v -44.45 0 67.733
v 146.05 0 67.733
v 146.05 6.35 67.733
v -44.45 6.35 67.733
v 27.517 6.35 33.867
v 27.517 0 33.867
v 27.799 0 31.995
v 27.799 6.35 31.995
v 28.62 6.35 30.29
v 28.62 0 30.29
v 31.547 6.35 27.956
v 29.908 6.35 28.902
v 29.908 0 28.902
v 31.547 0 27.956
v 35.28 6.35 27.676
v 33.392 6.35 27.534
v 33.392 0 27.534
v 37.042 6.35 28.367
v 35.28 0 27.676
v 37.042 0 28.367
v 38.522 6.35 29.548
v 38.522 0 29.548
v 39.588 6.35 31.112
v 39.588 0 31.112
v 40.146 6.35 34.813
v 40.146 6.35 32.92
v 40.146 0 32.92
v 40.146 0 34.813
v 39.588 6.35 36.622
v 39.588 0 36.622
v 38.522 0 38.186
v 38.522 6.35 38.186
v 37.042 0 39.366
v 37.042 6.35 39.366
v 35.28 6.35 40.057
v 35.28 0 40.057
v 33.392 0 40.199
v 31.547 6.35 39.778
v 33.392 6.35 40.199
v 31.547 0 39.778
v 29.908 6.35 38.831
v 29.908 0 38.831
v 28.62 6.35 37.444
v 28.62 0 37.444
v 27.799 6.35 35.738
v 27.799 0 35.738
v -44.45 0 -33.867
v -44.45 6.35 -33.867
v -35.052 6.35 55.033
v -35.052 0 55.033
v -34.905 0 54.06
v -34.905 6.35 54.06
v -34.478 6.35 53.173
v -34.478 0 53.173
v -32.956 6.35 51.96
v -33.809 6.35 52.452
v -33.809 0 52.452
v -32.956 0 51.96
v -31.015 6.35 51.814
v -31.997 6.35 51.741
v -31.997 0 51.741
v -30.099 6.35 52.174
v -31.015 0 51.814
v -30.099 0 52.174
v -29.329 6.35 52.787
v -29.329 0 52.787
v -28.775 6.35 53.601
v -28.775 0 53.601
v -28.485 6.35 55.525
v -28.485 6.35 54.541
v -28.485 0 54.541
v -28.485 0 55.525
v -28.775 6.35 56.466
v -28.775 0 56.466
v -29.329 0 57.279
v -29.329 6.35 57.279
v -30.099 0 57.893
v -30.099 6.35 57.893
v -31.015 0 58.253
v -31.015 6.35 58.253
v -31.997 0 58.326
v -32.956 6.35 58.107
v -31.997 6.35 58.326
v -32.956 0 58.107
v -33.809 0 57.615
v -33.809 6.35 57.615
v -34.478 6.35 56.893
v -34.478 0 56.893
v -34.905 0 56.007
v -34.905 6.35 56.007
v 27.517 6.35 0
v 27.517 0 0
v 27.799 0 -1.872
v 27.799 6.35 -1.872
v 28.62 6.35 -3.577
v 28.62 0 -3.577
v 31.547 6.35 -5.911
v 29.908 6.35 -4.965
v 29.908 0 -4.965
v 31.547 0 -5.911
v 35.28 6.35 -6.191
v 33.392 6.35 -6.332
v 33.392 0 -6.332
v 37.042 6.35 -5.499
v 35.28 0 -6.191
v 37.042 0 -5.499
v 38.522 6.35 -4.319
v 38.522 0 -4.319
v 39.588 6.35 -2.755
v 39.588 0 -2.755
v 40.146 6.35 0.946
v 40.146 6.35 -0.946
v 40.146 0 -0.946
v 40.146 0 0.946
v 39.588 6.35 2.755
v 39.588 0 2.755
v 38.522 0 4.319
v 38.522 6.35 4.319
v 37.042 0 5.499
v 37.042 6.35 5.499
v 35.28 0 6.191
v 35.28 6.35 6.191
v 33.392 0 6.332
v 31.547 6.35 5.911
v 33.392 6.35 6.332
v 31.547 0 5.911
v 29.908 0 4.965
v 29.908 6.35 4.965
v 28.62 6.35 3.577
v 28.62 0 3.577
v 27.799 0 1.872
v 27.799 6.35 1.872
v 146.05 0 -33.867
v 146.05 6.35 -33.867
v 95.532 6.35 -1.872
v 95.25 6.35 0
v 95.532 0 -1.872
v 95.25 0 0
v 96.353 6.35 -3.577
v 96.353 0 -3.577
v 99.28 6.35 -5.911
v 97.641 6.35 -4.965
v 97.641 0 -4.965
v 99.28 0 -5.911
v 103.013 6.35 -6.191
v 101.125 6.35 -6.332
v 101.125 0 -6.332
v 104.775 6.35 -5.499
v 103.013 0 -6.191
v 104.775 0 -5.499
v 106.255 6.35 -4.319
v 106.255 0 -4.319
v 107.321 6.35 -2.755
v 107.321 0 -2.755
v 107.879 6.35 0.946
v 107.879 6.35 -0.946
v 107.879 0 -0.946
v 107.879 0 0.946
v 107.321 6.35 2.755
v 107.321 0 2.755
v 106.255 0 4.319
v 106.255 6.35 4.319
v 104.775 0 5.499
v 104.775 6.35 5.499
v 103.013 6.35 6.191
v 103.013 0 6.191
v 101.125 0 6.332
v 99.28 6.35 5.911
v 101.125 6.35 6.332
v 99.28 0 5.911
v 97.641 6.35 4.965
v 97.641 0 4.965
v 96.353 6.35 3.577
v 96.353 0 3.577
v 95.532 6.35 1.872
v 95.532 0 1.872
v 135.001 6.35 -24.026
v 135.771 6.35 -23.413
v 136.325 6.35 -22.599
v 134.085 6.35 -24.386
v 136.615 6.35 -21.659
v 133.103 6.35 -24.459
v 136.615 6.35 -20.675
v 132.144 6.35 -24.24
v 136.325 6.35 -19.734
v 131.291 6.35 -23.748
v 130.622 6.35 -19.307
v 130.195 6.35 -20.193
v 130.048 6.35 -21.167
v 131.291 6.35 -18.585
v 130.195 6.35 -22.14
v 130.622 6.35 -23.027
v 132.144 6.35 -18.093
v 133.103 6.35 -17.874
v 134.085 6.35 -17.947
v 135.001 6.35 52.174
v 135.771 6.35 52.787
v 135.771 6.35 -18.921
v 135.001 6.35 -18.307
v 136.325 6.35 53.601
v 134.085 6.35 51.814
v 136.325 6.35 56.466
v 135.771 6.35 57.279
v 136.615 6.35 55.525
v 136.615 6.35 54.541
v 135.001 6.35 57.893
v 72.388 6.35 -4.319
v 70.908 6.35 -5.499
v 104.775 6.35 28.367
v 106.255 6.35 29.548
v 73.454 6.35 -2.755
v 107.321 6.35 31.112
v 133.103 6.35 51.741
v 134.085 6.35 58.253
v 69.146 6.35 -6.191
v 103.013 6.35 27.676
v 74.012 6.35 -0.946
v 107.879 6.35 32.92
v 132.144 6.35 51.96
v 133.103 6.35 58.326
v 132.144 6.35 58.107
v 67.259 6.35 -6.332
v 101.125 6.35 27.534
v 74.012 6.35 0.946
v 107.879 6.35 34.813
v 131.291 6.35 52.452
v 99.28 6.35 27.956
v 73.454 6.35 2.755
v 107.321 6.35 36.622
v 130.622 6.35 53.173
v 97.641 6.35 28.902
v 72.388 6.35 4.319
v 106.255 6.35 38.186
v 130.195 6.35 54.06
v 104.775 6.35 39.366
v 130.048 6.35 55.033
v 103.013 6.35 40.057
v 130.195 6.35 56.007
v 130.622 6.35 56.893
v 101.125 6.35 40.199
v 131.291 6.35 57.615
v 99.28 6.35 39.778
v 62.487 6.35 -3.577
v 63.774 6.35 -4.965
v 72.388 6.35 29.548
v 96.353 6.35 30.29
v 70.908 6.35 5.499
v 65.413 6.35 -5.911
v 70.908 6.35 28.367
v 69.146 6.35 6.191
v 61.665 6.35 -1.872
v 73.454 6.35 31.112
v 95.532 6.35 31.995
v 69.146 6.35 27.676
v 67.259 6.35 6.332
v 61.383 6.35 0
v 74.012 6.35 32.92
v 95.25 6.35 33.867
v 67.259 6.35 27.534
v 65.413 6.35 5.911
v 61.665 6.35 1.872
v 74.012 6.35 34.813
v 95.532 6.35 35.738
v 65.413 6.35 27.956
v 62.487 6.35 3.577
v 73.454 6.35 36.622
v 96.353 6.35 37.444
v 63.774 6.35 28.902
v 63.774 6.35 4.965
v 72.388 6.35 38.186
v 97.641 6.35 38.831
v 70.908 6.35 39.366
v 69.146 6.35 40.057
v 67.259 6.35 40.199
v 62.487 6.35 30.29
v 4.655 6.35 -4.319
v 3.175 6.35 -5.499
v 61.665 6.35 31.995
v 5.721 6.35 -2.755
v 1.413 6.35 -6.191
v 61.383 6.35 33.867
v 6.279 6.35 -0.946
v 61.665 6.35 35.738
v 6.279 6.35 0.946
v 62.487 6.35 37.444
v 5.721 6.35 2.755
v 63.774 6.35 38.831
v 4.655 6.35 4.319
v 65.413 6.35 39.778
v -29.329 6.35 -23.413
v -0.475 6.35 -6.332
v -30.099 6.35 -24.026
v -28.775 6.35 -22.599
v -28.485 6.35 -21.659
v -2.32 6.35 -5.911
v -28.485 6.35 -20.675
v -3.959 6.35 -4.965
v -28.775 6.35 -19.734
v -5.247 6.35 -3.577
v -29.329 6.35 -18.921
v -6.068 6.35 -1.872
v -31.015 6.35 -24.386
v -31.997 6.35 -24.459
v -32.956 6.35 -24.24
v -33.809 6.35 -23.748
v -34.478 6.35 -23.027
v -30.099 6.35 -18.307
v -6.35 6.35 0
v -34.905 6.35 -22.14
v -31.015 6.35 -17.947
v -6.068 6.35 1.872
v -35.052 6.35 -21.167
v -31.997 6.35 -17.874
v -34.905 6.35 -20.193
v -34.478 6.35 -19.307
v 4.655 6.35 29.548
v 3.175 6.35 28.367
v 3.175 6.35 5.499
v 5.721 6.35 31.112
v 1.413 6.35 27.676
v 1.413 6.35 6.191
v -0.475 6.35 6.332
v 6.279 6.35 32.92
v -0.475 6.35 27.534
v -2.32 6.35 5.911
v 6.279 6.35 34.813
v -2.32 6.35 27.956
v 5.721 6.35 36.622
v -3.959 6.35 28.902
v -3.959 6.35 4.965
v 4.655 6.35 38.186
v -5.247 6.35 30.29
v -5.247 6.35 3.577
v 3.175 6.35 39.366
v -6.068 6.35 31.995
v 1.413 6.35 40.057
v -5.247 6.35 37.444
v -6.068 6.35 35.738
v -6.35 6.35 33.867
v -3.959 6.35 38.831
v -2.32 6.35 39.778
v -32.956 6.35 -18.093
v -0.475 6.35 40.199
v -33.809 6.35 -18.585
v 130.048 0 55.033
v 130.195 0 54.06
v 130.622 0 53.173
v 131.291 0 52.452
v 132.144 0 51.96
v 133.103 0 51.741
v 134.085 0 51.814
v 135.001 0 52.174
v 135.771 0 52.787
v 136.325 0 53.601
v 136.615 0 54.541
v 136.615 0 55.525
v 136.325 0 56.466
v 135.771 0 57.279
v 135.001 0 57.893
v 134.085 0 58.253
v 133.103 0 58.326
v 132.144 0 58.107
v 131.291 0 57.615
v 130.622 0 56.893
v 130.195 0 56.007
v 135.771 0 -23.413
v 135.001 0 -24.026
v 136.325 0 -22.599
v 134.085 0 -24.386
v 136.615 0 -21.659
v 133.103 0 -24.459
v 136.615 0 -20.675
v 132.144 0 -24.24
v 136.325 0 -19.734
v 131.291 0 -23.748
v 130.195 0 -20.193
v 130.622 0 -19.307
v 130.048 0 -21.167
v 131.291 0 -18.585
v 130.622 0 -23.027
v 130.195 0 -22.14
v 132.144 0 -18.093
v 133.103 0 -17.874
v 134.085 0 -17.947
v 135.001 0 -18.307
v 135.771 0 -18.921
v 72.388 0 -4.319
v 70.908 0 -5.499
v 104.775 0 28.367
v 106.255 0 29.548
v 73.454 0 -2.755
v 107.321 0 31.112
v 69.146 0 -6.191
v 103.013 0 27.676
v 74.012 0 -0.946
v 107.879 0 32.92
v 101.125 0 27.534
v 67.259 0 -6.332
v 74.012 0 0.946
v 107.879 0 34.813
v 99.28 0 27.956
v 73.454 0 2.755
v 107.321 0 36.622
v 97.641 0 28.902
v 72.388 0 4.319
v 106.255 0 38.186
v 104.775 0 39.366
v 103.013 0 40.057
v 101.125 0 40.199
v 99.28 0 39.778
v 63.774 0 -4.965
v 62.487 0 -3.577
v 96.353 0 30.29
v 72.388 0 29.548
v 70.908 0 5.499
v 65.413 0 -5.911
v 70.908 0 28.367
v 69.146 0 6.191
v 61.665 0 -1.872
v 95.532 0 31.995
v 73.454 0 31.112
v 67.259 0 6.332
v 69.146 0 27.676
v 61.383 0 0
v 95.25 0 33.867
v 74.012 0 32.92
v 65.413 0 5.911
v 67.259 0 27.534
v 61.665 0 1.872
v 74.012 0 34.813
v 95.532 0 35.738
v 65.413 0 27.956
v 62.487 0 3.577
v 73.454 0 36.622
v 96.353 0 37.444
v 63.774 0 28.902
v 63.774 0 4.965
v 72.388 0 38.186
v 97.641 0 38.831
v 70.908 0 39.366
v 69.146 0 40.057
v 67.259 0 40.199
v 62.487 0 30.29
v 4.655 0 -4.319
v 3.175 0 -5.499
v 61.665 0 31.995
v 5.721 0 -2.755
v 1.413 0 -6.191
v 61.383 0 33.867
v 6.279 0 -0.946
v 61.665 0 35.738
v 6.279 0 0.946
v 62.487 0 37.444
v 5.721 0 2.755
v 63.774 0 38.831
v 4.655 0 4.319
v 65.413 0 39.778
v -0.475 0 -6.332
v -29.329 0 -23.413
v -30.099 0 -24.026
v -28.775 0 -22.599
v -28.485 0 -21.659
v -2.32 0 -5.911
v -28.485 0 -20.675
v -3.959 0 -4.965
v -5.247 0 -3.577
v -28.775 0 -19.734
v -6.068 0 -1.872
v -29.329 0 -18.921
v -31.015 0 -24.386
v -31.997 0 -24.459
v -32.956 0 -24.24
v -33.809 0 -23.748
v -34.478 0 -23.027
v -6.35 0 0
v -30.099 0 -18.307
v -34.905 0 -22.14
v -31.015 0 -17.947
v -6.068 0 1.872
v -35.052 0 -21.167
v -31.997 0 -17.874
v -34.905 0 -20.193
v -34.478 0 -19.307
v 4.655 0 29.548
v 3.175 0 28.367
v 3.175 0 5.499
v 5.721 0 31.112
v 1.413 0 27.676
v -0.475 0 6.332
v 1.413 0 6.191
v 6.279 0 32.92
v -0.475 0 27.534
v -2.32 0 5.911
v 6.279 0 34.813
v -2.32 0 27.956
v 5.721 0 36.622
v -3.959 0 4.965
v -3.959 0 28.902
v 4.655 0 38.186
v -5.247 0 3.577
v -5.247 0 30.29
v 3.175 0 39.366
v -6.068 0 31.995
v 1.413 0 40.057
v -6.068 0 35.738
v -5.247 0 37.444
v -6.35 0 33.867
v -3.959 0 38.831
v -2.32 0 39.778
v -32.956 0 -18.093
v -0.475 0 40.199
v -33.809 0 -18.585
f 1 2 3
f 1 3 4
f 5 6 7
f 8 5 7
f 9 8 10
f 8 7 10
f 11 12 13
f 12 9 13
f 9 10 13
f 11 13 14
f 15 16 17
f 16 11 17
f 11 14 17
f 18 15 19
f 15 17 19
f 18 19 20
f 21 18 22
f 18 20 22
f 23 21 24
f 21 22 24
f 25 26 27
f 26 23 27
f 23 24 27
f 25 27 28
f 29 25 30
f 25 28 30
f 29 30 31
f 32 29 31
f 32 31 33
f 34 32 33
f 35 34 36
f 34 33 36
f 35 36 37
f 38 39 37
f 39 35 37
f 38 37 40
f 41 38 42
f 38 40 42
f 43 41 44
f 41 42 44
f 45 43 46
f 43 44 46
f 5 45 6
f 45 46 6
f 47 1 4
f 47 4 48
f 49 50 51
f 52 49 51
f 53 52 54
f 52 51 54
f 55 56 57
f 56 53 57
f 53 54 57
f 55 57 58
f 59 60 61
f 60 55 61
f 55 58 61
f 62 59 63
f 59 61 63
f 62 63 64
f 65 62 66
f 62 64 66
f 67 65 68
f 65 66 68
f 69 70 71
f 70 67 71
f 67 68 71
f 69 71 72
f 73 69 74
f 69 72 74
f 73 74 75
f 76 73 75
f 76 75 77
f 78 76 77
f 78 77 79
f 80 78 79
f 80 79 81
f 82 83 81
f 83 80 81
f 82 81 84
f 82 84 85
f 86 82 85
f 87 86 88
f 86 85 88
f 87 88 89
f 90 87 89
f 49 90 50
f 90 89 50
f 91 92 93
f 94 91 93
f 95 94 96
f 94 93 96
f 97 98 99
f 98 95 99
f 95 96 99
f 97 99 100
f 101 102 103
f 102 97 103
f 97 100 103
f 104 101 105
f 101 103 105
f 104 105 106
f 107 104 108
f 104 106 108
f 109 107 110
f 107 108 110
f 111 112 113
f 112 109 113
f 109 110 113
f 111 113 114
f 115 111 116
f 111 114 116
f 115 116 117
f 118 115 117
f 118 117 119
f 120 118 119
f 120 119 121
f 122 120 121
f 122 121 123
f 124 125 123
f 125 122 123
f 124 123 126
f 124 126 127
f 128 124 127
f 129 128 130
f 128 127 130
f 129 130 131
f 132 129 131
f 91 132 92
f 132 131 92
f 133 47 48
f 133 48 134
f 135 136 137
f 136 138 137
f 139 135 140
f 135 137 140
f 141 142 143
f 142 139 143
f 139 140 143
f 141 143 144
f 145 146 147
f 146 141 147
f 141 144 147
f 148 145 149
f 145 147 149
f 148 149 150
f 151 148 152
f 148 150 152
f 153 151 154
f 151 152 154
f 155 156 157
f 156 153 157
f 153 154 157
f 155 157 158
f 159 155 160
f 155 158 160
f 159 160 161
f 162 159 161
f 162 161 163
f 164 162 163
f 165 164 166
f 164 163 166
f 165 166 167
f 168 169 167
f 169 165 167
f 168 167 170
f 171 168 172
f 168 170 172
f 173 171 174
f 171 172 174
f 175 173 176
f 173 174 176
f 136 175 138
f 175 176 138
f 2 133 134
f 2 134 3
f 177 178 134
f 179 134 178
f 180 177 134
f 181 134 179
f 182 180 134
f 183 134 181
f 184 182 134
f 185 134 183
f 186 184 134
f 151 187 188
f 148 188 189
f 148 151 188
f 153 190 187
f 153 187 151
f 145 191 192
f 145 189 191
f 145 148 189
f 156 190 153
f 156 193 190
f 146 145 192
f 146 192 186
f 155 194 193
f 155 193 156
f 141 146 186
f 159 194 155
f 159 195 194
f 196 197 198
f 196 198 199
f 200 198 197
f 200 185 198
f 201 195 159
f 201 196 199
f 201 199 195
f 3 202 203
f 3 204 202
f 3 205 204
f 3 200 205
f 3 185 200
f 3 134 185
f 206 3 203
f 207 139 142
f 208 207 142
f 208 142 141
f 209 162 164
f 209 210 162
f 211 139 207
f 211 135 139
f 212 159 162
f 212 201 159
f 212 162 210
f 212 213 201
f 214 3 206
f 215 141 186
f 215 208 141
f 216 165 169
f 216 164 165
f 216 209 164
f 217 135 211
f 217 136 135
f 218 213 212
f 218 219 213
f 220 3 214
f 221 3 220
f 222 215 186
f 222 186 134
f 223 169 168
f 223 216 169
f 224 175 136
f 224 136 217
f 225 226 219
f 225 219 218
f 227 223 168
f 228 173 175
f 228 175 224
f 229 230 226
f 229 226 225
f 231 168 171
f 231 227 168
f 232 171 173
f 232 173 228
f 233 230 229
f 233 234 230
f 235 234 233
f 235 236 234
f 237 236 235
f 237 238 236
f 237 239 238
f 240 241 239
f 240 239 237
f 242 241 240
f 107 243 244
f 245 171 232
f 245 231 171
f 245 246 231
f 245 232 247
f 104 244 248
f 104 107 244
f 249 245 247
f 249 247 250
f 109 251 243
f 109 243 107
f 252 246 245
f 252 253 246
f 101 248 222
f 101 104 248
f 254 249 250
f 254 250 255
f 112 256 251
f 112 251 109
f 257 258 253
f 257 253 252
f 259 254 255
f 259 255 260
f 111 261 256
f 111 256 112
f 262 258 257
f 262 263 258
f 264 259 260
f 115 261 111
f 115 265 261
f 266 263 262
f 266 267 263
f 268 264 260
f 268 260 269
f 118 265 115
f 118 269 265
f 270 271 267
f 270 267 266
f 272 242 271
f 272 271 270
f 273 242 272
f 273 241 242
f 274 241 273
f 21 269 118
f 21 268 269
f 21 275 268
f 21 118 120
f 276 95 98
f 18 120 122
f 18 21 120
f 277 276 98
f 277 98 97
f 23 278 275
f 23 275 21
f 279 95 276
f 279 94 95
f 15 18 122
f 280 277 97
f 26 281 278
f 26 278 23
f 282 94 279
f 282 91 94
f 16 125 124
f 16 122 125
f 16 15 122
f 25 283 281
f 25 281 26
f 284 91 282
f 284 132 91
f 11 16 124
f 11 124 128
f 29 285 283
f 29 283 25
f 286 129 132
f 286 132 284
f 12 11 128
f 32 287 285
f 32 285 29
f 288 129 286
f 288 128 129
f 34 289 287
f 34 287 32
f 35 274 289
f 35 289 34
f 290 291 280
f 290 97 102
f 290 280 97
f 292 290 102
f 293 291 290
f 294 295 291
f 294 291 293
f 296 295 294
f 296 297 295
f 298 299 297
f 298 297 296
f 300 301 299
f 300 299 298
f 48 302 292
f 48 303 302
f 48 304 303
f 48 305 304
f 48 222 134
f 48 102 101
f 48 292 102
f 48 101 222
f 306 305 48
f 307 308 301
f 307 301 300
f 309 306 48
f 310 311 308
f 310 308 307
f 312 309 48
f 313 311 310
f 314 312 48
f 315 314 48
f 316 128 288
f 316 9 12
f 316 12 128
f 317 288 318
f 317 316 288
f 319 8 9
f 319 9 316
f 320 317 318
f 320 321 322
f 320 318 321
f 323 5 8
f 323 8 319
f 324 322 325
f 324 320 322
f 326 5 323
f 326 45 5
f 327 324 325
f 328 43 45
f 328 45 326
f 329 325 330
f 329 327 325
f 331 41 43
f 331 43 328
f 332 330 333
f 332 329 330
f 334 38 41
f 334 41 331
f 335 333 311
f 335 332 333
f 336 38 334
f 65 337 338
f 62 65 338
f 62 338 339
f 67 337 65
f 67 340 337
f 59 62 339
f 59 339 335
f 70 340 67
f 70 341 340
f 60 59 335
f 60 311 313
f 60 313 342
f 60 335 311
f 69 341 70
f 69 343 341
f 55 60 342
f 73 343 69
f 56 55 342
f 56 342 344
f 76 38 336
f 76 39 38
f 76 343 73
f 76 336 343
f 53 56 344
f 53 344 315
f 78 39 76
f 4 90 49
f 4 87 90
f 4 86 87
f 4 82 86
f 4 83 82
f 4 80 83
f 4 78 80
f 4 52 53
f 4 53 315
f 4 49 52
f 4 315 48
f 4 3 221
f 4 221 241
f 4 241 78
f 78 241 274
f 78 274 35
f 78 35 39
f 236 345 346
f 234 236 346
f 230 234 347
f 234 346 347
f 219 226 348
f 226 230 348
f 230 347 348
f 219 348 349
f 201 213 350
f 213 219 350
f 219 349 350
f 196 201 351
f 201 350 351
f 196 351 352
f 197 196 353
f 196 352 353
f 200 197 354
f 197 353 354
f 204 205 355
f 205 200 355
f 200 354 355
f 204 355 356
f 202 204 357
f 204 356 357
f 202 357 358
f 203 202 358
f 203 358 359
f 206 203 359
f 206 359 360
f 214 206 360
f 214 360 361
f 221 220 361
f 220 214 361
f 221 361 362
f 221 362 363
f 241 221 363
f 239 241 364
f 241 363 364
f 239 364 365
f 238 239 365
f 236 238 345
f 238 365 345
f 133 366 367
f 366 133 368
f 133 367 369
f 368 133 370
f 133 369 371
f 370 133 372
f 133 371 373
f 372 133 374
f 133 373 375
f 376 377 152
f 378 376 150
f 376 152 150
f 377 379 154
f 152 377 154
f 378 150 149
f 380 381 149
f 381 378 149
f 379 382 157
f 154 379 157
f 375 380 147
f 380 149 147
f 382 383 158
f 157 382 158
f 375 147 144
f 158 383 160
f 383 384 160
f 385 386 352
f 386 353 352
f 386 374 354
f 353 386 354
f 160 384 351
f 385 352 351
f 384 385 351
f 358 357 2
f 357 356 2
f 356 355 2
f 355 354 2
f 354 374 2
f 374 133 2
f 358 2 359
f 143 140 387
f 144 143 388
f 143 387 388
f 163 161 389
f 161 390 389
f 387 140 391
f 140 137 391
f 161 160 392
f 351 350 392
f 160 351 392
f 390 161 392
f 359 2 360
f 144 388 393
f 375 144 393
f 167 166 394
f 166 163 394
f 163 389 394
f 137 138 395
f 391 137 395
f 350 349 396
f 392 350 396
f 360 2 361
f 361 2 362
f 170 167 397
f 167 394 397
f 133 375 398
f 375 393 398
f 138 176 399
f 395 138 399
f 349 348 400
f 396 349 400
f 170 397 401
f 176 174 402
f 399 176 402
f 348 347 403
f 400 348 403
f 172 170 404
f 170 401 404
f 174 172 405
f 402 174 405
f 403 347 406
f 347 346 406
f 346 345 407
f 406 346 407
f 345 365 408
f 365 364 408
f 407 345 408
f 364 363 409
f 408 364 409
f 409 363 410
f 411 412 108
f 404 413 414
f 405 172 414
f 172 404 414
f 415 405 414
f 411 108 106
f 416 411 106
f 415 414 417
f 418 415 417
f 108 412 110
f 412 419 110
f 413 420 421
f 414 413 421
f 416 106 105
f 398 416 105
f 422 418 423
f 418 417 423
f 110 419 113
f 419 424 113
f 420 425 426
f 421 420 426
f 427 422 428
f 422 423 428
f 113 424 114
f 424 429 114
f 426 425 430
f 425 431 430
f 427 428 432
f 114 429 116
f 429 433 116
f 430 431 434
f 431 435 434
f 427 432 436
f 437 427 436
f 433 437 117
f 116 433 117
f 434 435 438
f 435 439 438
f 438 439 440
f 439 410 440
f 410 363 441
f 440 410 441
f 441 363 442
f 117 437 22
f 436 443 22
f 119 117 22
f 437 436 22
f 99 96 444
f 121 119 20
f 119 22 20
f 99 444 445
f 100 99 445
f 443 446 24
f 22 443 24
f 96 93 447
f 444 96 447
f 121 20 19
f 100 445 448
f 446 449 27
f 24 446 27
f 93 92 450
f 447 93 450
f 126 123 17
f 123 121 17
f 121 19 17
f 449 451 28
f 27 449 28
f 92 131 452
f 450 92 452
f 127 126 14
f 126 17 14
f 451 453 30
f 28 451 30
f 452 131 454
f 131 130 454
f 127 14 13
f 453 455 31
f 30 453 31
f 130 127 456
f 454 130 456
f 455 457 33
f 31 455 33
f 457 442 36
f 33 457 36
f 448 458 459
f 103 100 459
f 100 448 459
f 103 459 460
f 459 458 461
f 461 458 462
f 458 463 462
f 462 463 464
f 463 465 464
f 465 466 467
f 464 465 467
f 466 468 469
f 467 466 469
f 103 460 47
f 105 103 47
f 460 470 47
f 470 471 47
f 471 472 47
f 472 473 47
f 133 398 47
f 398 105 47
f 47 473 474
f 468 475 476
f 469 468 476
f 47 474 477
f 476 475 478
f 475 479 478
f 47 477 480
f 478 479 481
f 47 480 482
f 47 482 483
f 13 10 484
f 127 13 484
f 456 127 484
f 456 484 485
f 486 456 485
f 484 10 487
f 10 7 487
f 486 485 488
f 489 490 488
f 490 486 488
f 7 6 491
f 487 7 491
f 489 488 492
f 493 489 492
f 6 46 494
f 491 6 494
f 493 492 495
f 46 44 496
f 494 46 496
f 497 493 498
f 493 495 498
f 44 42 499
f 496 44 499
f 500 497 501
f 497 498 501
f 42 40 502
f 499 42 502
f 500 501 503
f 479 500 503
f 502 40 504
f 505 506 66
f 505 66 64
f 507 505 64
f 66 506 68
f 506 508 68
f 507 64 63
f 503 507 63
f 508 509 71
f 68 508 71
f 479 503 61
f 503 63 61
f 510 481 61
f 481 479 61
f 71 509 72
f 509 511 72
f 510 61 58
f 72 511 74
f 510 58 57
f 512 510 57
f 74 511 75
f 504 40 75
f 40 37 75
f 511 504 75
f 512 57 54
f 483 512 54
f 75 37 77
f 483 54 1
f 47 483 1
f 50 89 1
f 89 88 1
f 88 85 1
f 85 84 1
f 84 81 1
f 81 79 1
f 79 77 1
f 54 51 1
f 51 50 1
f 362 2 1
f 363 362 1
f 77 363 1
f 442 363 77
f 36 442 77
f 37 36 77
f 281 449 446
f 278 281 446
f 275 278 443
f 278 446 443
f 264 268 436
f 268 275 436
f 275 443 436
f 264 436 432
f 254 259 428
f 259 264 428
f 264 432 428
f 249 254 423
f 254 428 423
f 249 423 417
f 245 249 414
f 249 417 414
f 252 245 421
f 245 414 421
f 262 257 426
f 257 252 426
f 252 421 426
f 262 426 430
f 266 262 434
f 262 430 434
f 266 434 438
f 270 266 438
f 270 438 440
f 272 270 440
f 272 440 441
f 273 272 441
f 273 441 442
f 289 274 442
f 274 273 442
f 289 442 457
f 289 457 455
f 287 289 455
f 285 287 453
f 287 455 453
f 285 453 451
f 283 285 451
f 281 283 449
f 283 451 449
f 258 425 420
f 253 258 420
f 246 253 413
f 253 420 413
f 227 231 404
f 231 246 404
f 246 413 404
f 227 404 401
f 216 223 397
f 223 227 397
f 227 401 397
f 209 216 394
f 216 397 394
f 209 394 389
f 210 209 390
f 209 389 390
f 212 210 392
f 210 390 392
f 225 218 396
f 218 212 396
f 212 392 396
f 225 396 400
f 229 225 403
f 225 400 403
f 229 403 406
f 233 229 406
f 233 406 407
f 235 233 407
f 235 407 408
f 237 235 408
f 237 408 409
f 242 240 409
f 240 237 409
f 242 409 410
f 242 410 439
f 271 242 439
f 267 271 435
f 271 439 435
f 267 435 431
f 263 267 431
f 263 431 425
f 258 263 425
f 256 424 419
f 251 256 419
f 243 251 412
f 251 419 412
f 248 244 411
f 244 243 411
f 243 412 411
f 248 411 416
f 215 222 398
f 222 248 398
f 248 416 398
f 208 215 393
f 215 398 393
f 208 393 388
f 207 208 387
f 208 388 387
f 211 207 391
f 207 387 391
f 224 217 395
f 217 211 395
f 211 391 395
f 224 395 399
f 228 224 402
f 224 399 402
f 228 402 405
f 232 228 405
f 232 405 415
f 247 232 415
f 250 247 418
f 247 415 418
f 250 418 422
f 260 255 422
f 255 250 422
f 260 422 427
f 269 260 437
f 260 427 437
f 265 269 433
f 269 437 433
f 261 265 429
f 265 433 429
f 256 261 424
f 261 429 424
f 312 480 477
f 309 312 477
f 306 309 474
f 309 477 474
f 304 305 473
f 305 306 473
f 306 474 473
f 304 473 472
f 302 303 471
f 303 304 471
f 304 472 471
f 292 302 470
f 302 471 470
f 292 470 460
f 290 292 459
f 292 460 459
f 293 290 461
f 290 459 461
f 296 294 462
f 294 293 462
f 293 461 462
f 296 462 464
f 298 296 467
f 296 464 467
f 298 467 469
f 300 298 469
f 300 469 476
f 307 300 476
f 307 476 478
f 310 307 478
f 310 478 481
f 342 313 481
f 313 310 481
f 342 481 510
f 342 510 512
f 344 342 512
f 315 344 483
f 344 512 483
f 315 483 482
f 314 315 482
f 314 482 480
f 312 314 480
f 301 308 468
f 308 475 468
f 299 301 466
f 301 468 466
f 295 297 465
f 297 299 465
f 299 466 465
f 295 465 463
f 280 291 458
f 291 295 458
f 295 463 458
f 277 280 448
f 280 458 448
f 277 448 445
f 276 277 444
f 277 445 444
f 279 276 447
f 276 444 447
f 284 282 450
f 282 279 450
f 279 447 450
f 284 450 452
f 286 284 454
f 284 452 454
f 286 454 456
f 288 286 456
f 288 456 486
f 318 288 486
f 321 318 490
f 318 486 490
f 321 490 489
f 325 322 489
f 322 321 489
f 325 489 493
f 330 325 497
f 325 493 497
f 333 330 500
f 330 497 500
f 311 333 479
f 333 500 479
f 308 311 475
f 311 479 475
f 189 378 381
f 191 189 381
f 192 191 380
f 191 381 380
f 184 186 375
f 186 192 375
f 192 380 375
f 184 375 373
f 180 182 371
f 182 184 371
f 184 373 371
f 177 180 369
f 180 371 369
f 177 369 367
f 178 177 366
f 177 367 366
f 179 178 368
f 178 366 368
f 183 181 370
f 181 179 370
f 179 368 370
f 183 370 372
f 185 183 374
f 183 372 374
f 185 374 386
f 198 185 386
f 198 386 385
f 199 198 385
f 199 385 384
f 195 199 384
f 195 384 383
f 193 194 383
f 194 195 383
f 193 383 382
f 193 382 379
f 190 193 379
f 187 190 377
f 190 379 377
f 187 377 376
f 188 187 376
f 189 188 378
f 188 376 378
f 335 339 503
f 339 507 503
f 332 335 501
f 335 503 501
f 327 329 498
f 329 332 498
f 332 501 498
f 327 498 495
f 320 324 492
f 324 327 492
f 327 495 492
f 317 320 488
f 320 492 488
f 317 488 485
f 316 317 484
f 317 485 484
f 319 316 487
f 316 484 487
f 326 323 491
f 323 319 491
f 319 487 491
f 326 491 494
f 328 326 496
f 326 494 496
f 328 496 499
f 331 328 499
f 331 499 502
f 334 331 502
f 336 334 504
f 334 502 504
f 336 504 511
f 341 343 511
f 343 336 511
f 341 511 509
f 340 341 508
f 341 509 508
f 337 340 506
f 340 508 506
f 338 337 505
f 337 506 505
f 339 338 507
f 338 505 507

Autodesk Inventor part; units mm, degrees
ref_plane "YZ Plane" through (0, 0, 0) normal (1, 0, 0) x (0, 1, 0)
ref_plane "XZ Plane" through (0, 0, 0) normal (0, 1, 0) x (-1, 0, 0)
ref_plane "XY Plane" through (0, 0, 0) normal (0, 0, 1) x (1, 0, 0)
sketch "Sketch1" plane through (0, 0, 0) normal (0, 1, 0) x (-1, 0, 0)
  circle A0 centre (0, 0) radius 6.35
  line L0 (0, 0) -> (0, 25.4) construction
  line L1 (0, 0) -> (-101.6, 0) construction
  line L2 (44.45, -33.8667) -> (-146.05, -33.8667)
  line L3 (-146.05, -33.8667) -> (-146.05, 67.7333)
  line L4 (-146.05, 67.7333) -> (44.45, 67.7333)
  line L5 (44.45, 67.7333) -> (44.45, -33.8667)
  circle A1 centre (31.75, -21.1667) radius 3.302
  circle A2 centre (-133.35, -21.1667) radius 3.302
  circle A3 centre (-133.35, 55.0333) radius 3.302
  circle A4 centre (31.75, 55.0333) radius 3.302
  circle A5 centre (-33.8667, 0) radius 6.35
  circle A6 centre (-67.7333, 0) radius 6.35
  circle A7 centre (-101.6, 0) radius 6.35
  circle A8 centre (0, 33.8667) radius 6.35
  circle A9 centre (-33.8667, 33.8667) radius 6.35
  circle A10 centre (-67.7333, 33.8667) radius 6.35
  circle A11 centre (-101.6, 33.8667) radius 6.35
  dimension "d0" = 12.7
  dimension "d15" = 6.604
  dimension "d16" = 12.7
  dimension "d17" = 12.7
  dimension "d18" = 6.604
  dimension "d19" = 12.7
  dimension "d20" = 6.604
  dimension "d21" = 12.7
  dimension "d22" = 6.604
  dimension "d25" = 101.6
  dimension "d26" = 33.8667
  dimension "d27" = 12.7
  dimension "d28" = 12.7
  dimension "d29" = 12.7
  dimension "d30" = 44.45
  dimension "d31" = 190.5
  dimension "d34" = 33.8667
  dimension "d37" = 33.8667
extrude "Extrusion2" add sketch "Sketch1" along normal blind 6.35
equation "\"d26\" = 0.333333 * d25"
equation "\"d37\" = 0.333333 * d25"
properties part number "SequenceMachine_VialPlate"
